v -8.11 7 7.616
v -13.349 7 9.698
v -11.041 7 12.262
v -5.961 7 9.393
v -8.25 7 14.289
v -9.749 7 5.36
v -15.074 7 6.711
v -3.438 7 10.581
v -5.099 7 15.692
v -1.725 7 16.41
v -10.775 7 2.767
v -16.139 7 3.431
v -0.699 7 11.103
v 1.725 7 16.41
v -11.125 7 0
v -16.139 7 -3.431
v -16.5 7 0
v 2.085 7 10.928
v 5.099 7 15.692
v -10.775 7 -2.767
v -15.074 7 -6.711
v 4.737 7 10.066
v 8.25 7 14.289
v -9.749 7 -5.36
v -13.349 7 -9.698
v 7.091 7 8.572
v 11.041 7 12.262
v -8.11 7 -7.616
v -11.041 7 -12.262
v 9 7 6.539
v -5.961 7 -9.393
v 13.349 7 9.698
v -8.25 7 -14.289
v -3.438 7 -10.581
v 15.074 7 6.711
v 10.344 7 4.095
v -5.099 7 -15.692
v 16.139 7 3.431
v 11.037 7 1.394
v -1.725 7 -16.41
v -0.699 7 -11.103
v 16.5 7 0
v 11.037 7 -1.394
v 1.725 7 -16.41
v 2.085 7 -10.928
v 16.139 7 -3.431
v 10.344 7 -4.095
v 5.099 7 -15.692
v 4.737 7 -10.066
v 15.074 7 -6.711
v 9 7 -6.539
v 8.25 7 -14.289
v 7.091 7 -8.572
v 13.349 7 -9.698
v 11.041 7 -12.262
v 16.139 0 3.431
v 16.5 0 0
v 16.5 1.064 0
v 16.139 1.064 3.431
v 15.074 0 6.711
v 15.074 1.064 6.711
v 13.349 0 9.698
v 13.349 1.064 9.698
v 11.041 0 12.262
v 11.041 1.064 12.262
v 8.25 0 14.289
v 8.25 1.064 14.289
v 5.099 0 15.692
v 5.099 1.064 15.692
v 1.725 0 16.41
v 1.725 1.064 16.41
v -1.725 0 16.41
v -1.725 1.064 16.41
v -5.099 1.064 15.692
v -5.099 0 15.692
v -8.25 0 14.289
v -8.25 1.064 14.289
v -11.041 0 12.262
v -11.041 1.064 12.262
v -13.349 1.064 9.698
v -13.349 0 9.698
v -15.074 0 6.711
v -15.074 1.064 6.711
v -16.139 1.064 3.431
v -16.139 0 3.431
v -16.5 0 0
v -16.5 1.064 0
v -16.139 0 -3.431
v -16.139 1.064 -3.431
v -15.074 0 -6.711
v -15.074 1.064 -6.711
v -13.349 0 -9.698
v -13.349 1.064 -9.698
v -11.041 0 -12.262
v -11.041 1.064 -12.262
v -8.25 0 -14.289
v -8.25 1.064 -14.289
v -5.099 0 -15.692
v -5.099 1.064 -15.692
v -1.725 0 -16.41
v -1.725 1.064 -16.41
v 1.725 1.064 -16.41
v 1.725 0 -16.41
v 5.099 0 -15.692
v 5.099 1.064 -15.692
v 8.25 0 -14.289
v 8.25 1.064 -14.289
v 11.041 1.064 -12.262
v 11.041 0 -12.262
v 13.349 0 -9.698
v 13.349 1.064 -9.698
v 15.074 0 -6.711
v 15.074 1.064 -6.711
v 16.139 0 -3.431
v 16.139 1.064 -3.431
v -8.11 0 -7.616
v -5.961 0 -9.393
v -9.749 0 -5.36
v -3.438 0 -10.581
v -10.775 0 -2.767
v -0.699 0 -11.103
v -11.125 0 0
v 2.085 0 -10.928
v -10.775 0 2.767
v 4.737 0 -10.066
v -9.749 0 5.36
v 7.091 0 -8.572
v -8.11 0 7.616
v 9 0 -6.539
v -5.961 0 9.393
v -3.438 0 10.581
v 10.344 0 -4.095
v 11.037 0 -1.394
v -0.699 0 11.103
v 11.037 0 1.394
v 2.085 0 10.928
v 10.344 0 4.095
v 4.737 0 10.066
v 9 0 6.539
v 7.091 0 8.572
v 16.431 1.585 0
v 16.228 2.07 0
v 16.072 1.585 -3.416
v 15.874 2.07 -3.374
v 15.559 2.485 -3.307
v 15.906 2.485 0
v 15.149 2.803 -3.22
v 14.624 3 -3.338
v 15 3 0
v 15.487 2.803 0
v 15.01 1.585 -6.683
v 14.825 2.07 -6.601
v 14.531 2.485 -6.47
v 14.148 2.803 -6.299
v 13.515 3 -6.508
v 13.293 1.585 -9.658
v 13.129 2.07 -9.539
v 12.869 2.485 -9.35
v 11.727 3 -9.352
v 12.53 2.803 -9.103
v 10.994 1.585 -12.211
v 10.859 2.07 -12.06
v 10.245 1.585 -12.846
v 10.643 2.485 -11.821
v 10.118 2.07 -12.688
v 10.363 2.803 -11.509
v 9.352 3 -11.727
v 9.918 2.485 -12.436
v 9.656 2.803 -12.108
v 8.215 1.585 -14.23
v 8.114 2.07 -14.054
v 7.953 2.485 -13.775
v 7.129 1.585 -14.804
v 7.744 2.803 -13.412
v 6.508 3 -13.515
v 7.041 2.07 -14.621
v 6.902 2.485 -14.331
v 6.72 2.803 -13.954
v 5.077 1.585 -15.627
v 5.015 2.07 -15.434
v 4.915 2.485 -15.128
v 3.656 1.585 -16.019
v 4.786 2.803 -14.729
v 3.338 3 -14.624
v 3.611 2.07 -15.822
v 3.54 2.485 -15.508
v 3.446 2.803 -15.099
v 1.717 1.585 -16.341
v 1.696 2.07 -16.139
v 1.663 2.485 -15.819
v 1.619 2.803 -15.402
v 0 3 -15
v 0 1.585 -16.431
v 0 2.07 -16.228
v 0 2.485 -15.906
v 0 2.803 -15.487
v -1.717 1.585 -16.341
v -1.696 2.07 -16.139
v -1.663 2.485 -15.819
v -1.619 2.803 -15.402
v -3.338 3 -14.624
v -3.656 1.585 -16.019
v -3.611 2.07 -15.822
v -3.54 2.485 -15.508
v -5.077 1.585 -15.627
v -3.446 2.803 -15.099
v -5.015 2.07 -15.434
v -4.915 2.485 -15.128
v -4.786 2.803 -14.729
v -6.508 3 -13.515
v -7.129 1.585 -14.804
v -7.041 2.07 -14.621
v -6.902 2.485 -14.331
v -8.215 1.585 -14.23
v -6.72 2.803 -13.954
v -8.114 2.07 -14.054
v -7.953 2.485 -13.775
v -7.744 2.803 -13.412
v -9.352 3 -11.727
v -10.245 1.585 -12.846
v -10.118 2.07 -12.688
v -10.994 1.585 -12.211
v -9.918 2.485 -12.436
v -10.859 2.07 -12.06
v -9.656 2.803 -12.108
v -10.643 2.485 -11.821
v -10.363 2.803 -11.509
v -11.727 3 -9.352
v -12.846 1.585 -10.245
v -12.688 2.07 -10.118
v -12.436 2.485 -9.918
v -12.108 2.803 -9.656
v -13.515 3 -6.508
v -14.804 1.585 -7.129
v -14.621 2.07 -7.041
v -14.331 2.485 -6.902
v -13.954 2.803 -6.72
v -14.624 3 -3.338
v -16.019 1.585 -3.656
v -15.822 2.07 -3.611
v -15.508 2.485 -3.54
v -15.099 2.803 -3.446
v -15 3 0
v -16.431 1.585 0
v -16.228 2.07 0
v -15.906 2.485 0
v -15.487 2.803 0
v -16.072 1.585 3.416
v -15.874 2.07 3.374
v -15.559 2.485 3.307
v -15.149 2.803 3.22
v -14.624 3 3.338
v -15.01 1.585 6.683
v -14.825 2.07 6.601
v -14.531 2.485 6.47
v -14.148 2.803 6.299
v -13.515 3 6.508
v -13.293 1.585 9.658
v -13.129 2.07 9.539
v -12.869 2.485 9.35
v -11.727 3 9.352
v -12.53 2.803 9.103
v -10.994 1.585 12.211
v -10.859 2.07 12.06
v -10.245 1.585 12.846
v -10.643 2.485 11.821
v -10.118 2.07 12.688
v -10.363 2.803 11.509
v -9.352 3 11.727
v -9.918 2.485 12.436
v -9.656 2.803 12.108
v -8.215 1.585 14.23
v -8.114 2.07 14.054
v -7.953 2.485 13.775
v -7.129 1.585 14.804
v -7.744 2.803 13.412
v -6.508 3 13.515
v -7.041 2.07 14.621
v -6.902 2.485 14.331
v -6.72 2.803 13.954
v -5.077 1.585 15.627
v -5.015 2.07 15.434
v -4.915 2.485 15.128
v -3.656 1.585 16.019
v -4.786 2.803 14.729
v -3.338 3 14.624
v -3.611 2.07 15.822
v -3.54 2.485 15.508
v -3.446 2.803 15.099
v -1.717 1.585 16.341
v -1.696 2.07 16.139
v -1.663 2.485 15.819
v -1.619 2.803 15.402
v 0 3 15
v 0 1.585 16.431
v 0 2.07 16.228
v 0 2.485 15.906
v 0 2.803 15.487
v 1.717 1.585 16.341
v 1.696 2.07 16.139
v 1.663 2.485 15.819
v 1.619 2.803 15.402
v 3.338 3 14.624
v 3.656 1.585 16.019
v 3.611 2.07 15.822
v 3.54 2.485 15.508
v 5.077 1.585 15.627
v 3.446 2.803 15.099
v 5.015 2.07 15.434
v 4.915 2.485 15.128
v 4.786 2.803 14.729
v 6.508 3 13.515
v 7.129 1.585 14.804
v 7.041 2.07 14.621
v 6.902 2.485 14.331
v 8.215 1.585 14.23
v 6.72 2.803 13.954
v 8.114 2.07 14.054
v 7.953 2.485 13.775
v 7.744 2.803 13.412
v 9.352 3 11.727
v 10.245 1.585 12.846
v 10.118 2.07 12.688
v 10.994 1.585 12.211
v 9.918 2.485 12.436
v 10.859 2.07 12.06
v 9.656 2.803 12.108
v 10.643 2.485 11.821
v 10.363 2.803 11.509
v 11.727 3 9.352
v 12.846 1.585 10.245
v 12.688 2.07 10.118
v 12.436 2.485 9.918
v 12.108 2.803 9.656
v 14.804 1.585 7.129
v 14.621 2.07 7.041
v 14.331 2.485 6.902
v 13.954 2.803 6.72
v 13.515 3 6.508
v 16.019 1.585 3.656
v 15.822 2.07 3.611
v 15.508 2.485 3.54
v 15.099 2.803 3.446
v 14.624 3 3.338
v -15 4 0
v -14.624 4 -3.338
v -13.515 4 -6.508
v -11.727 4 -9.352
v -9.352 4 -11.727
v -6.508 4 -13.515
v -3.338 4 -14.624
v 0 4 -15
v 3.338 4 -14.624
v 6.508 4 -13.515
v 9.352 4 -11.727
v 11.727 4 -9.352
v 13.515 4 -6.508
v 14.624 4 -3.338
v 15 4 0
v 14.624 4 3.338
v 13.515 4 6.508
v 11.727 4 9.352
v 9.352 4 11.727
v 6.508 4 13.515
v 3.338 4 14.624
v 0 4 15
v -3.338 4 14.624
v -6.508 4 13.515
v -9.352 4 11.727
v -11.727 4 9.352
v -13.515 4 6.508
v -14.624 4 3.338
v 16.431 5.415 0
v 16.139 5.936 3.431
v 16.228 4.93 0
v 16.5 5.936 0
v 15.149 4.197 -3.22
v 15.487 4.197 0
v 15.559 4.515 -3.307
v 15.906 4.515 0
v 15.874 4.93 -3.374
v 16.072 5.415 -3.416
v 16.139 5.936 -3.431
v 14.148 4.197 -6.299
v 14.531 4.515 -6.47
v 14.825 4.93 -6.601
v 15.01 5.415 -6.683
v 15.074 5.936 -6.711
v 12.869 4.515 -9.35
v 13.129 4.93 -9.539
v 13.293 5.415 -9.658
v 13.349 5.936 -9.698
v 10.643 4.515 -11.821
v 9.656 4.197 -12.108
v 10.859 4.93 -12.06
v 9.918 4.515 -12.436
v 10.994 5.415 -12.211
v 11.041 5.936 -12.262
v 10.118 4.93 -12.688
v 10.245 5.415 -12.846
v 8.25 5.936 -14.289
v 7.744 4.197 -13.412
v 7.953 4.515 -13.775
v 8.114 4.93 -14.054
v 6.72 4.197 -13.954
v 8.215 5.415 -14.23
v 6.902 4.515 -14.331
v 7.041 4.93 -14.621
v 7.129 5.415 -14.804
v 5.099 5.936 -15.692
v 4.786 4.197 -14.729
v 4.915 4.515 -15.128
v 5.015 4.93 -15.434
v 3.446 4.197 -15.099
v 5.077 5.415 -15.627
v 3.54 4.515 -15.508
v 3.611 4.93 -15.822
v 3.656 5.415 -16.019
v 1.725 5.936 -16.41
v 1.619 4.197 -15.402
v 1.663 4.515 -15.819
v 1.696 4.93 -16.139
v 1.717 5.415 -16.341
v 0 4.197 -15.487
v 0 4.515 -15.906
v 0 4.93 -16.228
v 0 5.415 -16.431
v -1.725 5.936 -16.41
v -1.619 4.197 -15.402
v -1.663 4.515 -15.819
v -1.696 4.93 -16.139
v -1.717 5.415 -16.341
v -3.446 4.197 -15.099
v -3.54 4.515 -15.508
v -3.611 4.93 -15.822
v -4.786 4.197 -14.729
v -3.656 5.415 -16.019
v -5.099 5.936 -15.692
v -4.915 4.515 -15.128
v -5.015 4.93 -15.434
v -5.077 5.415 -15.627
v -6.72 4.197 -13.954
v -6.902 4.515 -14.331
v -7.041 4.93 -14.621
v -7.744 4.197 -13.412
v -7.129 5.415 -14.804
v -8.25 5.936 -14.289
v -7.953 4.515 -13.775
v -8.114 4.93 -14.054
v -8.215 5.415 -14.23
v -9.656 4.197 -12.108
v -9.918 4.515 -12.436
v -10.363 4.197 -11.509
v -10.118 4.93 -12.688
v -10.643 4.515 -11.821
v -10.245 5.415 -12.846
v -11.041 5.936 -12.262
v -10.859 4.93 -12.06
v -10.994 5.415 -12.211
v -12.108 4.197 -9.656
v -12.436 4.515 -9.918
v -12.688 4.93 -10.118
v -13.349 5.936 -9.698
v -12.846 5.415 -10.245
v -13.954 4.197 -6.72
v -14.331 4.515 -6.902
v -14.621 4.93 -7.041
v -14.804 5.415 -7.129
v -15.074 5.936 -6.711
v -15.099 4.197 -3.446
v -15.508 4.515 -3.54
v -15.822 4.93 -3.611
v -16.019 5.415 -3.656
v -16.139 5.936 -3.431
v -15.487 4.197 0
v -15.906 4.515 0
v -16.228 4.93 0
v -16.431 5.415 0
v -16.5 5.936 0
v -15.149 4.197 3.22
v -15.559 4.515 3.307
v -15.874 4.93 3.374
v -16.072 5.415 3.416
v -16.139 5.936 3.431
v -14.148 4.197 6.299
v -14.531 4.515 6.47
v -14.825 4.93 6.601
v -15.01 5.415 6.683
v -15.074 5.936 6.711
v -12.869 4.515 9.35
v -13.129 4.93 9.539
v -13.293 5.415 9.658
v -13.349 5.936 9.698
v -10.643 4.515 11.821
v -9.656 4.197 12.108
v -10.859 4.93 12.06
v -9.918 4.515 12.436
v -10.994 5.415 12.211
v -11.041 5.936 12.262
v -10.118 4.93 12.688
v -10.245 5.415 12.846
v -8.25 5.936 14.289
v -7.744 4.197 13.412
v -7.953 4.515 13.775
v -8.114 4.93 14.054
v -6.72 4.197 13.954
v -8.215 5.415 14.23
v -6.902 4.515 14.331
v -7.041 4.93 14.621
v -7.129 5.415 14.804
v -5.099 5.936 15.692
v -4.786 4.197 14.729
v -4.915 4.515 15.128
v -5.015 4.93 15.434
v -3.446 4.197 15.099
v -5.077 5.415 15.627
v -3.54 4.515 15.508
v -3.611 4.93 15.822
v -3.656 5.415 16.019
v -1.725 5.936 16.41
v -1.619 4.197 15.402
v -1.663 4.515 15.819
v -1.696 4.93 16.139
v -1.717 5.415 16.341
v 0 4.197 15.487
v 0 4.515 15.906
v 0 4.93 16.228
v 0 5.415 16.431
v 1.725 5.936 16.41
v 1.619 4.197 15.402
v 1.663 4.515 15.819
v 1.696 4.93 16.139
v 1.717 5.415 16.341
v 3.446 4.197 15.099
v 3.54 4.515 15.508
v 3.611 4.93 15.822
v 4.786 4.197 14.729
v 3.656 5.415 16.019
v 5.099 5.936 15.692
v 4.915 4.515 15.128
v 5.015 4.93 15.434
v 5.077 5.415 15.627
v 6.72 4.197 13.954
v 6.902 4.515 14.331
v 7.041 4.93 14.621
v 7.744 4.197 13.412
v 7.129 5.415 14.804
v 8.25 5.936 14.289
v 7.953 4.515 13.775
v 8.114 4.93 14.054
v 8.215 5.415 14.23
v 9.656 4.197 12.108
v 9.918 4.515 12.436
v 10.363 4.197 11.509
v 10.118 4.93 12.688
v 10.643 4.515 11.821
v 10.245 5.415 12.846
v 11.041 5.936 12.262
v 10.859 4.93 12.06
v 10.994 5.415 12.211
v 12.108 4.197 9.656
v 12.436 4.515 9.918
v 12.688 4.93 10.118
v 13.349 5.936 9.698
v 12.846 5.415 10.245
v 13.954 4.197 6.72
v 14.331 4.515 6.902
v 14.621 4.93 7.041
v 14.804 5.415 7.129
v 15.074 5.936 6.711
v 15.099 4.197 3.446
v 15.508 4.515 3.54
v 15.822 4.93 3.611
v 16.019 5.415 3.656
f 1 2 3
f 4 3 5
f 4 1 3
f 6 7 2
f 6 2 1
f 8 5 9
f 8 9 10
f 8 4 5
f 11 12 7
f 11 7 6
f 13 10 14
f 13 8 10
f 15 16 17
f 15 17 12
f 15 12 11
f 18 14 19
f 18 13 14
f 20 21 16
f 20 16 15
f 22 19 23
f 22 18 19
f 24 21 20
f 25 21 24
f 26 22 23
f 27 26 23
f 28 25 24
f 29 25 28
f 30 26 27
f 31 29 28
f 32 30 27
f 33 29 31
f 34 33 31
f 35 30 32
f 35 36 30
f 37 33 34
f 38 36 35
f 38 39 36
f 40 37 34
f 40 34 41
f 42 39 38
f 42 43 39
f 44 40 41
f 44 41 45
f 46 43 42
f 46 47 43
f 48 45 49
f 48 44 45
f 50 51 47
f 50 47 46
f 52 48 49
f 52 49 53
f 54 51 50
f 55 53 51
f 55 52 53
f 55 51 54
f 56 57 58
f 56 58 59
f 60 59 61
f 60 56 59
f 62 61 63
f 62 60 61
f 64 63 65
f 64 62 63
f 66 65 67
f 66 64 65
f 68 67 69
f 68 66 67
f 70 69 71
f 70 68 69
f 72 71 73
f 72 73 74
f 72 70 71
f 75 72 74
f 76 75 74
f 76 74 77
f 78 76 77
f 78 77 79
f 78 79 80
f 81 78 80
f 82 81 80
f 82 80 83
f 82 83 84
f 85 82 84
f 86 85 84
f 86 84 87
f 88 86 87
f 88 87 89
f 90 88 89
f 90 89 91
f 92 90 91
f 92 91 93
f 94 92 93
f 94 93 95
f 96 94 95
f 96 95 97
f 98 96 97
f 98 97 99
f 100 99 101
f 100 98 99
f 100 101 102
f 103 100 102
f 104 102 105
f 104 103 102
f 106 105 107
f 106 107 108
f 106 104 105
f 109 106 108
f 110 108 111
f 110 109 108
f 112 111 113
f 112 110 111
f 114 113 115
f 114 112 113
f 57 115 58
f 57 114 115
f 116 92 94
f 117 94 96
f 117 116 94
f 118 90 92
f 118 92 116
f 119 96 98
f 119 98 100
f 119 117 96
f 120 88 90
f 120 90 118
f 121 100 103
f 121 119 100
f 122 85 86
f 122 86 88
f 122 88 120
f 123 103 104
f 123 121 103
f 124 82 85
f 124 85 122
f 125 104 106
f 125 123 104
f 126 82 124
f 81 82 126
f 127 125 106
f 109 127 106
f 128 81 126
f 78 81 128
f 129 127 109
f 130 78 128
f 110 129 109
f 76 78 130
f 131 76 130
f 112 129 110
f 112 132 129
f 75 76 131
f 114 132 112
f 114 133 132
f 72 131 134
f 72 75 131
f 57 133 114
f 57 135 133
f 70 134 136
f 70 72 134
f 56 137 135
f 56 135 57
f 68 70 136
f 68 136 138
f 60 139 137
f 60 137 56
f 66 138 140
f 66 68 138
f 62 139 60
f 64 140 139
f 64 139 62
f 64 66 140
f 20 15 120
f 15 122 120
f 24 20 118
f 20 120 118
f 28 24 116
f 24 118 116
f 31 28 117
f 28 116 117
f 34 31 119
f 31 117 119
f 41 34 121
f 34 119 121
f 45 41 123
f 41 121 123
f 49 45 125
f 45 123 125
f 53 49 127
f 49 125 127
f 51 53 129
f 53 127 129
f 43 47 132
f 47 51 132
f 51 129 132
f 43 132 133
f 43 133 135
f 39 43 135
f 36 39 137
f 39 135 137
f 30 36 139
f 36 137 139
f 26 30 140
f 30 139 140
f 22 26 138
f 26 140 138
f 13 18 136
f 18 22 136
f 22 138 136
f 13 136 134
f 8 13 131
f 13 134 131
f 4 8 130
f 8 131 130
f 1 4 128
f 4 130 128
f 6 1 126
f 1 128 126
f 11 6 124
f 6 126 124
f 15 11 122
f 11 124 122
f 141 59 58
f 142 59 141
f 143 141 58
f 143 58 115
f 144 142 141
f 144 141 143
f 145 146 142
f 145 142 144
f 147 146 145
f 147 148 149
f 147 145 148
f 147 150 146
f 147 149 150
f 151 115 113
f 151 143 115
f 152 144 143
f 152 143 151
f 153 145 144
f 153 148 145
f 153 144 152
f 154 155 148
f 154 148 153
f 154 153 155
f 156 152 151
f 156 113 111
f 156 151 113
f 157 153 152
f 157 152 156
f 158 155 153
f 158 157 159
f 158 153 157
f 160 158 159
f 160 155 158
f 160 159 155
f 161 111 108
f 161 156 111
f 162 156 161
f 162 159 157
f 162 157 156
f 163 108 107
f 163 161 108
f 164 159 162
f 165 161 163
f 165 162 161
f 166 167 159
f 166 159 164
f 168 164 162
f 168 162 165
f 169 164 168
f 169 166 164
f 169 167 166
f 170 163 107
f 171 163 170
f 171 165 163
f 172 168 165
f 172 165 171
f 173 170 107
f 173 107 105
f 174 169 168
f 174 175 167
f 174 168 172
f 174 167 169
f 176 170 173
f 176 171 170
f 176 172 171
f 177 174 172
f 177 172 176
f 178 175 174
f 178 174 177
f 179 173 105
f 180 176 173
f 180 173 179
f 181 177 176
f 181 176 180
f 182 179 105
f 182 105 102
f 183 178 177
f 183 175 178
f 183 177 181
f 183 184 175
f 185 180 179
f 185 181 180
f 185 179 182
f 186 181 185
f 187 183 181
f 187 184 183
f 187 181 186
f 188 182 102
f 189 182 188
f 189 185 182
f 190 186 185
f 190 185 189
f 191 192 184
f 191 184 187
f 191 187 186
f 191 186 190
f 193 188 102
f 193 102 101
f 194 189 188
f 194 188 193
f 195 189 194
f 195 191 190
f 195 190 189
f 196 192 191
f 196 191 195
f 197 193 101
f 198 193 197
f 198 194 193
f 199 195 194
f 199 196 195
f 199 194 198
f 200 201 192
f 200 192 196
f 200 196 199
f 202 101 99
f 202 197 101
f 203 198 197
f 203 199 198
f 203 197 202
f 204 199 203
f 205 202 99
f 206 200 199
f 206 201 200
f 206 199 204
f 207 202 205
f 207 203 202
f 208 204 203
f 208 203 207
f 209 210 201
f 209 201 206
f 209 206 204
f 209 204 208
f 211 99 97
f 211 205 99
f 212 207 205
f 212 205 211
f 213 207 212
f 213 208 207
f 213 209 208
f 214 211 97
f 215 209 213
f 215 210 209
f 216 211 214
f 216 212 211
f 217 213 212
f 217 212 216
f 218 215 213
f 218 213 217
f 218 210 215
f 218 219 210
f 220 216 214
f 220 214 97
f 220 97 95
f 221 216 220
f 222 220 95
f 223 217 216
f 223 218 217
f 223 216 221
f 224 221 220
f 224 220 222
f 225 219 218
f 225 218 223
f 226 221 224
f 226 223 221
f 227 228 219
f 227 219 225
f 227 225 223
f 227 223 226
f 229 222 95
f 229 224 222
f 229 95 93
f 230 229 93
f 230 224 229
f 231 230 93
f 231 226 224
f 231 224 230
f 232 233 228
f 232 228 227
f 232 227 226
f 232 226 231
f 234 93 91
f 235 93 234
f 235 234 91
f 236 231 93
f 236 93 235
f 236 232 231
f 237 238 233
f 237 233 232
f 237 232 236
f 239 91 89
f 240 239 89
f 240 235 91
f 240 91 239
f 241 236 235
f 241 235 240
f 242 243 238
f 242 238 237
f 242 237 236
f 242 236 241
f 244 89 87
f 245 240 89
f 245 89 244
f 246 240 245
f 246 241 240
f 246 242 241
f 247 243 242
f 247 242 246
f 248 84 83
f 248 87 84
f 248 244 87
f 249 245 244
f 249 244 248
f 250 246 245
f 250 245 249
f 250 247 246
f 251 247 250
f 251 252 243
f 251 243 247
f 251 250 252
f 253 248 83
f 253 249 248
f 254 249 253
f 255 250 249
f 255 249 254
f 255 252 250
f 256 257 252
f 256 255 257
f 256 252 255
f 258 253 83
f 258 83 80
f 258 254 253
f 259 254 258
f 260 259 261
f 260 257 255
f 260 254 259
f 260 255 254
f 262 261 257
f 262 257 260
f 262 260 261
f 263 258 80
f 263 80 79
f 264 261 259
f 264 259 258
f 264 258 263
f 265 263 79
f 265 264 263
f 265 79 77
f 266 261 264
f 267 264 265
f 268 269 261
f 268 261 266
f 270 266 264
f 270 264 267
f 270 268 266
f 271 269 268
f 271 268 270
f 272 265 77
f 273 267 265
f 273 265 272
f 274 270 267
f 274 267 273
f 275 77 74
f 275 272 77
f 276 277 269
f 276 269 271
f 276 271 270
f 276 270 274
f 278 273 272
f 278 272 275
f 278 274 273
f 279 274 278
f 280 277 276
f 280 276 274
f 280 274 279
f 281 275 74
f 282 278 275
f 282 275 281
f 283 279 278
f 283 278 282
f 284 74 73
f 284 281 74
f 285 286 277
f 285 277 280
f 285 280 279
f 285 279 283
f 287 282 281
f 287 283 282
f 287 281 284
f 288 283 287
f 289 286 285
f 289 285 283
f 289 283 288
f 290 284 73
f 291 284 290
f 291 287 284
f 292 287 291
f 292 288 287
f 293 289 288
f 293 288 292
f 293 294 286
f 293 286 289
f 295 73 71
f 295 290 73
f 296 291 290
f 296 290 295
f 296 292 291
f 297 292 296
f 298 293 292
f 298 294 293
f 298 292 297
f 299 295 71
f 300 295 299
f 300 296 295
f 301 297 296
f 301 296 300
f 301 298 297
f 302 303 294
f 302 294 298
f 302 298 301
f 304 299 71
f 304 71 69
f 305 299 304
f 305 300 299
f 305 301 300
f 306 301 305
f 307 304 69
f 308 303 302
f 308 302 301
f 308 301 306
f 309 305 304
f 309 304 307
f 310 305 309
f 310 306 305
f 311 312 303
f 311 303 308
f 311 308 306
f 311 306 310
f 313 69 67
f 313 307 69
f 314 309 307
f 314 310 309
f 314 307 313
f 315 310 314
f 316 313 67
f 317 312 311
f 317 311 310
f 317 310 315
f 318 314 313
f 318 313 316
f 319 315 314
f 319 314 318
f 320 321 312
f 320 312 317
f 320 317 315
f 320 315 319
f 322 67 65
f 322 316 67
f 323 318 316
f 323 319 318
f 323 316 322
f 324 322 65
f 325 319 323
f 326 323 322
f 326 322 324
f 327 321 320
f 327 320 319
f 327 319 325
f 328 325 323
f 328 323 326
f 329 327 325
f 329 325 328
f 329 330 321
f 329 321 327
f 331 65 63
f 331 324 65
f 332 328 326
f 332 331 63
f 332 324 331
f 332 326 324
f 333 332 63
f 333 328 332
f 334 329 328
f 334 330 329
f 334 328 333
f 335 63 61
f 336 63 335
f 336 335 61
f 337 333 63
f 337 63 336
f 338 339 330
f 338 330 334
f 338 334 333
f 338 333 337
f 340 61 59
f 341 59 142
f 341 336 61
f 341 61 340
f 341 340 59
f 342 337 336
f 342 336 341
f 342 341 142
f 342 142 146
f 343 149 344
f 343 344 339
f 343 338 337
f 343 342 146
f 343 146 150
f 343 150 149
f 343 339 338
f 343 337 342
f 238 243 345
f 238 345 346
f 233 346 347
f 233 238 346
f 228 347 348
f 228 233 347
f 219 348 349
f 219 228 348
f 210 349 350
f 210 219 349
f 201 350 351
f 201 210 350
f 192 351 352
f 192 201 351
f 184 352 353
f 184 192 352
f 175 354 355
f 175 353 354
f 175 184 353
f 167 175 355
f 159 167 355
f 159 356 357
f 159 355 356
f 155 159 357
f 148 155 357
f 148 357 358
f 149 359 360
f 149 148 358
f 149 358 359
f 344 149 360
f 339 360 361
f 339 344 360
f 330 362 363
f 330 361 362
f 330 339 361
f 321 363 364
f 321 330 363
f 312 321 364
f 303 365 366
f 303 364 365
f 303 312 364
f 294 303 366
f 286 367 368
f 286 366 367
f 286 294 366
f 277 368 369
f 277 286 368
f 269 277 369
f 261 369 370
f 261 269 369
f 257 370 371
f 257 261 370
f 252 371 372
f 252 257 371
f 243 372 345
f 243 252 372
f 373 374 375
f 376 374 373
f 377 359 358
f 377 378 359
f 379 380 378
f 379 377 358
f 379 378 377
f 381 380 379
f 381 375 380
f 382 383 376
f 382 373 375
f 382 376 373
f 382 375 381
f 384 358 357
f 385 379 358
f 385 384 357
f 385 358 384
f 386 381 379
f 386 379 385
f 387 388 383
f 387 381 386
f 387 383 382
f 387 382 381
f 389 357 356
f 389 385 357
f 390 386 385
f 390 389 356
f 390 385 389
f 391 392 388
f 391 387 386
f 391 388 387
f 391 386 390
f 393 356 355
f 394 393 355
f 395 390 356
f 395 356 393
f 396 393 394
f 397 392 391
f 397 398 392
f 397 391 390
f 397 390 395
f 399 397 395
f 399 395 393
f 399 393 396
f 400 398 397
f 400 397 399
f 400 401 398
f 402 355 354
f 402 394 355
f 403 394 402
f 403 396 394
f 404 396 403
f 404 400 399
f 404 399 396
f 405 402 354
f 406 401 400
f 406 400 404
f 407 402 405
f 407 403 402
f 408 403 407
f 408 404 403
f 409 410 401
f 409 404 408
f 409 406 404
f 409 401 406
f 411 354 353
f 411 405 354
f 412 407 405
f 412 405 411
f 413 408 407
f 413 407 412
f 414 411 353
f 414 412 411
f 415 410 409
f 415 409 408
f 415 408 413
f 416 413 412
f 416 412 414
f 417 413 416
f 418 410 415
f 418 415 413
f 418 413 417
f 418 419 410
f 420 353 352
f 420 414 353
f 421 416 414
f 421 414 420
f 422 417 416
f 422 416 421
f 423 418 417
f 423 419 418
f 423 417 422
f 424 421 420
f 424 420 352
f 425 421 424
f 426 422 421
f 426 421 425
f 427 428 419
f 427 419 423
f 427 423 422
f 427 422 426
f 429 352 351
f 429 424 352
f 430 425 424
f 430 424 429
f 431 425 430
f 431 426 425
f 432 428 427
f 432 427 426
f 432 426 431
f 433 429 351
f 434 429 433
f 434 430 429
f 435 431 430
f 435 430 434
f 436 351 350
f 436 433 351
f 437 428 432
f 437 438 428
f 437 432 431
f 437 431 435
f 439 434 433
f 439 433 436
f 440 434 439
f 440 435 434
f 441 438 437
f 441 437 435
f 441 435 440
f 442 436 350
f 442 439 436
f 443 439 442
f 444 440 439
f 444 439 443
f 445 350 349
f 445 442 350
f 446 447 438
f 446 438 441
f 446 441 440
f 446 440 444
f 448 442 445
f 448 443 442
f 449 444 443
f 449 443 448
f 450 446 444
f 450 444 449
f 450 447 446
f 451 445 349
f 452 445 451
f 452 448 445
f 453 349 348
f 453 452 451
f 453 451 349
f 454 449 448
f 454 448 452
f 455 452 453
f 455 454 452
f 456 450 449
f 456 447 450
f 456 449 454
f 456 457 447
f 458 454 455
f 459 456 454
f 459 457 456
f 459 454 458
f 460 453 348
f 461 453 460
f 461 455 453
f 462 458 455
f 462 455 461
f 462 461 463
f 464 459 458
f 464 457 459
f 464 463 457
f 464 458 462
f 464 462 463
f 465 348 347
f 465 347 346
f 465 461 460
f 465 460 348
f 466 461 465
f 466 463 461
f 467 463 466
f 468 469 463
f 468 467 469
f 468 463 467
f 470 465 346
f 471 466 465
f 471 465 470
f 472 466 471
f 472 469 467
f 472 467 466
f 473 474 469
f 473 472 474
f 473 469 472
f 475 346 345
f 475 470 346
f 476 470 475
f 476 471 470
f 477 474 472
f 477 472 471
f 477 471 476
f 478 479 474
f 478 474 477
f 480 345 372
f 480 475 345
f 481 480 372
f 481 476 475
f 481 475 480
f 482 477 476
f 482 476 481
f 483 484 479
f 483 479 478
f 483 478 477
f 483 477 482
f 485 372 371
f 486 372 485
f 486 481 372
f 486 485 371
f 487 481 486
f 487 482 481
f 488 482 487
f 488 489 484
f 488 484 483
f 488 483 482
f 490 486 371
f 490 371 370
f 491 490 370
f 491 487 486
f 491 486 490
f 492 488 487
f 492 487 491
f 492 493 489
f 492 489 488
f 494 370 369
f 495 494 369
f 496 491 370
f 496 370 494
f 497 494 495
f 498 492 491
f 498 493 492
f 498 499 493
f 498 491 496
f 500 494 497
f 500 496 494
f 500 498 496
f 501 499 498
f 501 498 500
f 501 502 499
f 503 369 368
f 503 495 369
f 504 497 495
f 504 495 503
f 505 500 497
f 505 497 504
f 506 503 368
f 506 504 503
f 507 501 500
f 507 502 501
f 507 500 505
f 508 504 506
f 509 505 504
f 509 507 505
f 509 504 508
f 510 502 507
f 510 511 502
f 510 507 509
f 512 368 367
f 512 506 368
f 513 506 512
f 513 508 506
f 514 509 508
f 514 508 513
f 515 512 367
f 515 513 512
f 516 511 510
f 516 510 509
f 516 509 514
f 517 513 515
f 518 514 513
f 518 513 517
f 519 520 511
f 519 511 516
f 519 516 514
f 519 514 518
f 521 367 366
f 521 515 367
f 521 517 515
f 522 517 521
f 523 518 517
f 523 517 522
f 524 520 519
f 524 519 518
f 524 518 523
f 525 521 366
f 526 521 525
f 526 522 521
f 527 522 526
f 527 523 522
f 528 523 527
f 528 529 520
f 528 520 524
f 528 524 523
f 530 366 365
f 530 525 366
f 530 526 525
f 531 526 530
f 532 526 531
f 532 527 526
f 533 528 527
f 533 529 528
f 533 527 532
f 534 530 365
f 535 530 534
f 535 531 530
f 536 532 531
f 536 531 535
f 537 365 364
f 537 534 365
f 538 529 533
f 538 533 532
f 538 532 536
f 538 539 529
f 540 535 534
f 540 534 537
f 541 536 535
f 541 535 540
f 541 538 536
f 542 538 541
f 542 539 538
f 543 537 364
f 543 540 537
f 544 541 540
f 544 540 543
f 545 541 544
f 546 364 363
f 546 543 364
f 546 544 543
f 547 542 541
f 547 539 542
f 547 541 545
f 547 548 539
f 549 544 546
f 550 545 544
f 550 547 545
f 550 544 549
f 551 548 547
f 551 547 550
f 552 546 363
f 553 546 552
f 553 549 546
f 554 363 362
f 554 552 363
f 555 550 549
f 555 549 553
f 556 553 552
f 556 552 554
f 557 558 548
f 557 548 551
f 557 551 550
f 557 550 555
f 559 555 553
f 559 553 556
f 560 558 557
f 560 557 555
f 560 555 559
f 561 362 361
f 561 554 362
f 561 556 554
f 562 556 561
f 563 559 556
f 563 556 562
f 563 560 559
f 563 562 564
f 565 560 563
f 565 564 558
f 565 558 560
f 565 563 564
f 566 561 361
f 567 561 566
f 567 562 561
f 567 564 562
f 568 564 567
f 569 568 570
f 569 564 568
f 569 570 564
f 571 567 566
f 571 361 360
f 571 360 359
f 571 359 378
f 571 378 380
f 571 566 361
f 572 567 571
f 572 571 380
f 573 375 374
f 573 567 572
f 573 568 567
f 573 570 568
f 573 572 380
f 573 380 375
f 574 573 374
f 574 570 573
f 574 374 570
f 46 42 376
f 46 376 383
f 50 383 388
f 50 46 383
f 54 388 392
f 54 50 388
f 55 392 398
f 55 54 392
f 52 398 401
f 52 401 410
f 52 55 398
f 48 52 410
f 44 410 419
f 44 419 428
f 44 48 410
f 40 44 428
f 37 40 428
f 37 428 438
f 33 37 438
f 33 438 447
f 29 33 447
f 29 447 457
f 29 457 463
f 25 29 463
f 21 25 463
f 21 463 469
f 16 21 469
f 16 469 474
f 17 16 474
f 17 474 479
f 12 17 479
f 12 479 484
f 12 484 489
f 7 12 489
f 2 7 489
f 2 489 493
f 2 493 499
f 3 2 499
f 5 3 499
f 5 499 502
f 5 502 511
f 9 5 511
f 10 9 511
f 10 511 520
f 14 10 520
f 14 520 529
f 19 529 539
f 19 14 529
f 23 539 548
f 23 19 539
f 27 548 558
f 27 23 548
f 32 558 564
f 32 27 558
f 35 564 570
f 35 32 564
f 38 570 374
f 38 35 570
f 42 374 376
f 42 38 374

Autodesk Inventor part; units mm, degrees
ref_plane "YZ Plane" through (0, 0, 0) normal (1, 0, 0) x (0, 1, 0)
ref_plane "XZ Plane" through (0, 0, 0) normal (0, 1, 0) x (-1, 0, 0)
ref_plane "XY Plane" through (0, 0, 0) normal (0, 0, 1) x (1, 0, 0)
sketch "Sketch1" plane through (0, 0, 0) normal (0, 1, 0) x (-1, 0, 0)
  circle A0 centre (0, 0) radius 11.125
  circle A1 centre (0, 0) radius 15
  dimension "d0" = 22.25
  dimension "d1" = 30
extrude "Extrusion1" add sketch "Sketch1" along normal blind 7
sketch "Sketch2" plane through (0, 7, 0) normal (0, 1, 0) x (1, 0, 0)
  circle A0 centre (0, 0) radius 13.625
  circle A1 centre (0, 0) radius 15
  dimension "d4" = 30
extrude "Extrusion2" add sketch "Sketch2" against normal blind 3
sketch "Sketch3" plane through (0, 0, 0) normal (0, -1, 0) x (1, 0, 0)
  circle A0 centre (0, 0) radius 13.625
  circle A1 centre (0, 0) radius 15
  dimension "d7" = 30
extrude "Extrusion3" add sketch "Sketch3" against normal blind 3
sketch "Sketch4" plane through (0, 7, 0) normal (0, 1, 0) x (1, 0, 0)
  circle A0 centre (0, 0) radius 15
  circle A1 centre (0, 0) radius 16.5
  dimension "d12" = 33
extrude "Extrusion4" add sketch "Sketch4" against normal blind 3
sketch "Sketch5" plane through (0, 0, 0) normal (0, -1, 0) x (1, 0, 0)
  circle A0 centre (0, 0) radius 15
  circle A1 centre (0, 0) radius 16.5
extrude "Extrusion5" add sketch "Sketch5" against normal blind 3
fillet "Fillet3" radius 2 1 edges at (-16.5, 4, 0)
fillet "Fillet4" radius 2 1 edges at (-16.5, 3, 0)
properties part number "OutterBearing"
